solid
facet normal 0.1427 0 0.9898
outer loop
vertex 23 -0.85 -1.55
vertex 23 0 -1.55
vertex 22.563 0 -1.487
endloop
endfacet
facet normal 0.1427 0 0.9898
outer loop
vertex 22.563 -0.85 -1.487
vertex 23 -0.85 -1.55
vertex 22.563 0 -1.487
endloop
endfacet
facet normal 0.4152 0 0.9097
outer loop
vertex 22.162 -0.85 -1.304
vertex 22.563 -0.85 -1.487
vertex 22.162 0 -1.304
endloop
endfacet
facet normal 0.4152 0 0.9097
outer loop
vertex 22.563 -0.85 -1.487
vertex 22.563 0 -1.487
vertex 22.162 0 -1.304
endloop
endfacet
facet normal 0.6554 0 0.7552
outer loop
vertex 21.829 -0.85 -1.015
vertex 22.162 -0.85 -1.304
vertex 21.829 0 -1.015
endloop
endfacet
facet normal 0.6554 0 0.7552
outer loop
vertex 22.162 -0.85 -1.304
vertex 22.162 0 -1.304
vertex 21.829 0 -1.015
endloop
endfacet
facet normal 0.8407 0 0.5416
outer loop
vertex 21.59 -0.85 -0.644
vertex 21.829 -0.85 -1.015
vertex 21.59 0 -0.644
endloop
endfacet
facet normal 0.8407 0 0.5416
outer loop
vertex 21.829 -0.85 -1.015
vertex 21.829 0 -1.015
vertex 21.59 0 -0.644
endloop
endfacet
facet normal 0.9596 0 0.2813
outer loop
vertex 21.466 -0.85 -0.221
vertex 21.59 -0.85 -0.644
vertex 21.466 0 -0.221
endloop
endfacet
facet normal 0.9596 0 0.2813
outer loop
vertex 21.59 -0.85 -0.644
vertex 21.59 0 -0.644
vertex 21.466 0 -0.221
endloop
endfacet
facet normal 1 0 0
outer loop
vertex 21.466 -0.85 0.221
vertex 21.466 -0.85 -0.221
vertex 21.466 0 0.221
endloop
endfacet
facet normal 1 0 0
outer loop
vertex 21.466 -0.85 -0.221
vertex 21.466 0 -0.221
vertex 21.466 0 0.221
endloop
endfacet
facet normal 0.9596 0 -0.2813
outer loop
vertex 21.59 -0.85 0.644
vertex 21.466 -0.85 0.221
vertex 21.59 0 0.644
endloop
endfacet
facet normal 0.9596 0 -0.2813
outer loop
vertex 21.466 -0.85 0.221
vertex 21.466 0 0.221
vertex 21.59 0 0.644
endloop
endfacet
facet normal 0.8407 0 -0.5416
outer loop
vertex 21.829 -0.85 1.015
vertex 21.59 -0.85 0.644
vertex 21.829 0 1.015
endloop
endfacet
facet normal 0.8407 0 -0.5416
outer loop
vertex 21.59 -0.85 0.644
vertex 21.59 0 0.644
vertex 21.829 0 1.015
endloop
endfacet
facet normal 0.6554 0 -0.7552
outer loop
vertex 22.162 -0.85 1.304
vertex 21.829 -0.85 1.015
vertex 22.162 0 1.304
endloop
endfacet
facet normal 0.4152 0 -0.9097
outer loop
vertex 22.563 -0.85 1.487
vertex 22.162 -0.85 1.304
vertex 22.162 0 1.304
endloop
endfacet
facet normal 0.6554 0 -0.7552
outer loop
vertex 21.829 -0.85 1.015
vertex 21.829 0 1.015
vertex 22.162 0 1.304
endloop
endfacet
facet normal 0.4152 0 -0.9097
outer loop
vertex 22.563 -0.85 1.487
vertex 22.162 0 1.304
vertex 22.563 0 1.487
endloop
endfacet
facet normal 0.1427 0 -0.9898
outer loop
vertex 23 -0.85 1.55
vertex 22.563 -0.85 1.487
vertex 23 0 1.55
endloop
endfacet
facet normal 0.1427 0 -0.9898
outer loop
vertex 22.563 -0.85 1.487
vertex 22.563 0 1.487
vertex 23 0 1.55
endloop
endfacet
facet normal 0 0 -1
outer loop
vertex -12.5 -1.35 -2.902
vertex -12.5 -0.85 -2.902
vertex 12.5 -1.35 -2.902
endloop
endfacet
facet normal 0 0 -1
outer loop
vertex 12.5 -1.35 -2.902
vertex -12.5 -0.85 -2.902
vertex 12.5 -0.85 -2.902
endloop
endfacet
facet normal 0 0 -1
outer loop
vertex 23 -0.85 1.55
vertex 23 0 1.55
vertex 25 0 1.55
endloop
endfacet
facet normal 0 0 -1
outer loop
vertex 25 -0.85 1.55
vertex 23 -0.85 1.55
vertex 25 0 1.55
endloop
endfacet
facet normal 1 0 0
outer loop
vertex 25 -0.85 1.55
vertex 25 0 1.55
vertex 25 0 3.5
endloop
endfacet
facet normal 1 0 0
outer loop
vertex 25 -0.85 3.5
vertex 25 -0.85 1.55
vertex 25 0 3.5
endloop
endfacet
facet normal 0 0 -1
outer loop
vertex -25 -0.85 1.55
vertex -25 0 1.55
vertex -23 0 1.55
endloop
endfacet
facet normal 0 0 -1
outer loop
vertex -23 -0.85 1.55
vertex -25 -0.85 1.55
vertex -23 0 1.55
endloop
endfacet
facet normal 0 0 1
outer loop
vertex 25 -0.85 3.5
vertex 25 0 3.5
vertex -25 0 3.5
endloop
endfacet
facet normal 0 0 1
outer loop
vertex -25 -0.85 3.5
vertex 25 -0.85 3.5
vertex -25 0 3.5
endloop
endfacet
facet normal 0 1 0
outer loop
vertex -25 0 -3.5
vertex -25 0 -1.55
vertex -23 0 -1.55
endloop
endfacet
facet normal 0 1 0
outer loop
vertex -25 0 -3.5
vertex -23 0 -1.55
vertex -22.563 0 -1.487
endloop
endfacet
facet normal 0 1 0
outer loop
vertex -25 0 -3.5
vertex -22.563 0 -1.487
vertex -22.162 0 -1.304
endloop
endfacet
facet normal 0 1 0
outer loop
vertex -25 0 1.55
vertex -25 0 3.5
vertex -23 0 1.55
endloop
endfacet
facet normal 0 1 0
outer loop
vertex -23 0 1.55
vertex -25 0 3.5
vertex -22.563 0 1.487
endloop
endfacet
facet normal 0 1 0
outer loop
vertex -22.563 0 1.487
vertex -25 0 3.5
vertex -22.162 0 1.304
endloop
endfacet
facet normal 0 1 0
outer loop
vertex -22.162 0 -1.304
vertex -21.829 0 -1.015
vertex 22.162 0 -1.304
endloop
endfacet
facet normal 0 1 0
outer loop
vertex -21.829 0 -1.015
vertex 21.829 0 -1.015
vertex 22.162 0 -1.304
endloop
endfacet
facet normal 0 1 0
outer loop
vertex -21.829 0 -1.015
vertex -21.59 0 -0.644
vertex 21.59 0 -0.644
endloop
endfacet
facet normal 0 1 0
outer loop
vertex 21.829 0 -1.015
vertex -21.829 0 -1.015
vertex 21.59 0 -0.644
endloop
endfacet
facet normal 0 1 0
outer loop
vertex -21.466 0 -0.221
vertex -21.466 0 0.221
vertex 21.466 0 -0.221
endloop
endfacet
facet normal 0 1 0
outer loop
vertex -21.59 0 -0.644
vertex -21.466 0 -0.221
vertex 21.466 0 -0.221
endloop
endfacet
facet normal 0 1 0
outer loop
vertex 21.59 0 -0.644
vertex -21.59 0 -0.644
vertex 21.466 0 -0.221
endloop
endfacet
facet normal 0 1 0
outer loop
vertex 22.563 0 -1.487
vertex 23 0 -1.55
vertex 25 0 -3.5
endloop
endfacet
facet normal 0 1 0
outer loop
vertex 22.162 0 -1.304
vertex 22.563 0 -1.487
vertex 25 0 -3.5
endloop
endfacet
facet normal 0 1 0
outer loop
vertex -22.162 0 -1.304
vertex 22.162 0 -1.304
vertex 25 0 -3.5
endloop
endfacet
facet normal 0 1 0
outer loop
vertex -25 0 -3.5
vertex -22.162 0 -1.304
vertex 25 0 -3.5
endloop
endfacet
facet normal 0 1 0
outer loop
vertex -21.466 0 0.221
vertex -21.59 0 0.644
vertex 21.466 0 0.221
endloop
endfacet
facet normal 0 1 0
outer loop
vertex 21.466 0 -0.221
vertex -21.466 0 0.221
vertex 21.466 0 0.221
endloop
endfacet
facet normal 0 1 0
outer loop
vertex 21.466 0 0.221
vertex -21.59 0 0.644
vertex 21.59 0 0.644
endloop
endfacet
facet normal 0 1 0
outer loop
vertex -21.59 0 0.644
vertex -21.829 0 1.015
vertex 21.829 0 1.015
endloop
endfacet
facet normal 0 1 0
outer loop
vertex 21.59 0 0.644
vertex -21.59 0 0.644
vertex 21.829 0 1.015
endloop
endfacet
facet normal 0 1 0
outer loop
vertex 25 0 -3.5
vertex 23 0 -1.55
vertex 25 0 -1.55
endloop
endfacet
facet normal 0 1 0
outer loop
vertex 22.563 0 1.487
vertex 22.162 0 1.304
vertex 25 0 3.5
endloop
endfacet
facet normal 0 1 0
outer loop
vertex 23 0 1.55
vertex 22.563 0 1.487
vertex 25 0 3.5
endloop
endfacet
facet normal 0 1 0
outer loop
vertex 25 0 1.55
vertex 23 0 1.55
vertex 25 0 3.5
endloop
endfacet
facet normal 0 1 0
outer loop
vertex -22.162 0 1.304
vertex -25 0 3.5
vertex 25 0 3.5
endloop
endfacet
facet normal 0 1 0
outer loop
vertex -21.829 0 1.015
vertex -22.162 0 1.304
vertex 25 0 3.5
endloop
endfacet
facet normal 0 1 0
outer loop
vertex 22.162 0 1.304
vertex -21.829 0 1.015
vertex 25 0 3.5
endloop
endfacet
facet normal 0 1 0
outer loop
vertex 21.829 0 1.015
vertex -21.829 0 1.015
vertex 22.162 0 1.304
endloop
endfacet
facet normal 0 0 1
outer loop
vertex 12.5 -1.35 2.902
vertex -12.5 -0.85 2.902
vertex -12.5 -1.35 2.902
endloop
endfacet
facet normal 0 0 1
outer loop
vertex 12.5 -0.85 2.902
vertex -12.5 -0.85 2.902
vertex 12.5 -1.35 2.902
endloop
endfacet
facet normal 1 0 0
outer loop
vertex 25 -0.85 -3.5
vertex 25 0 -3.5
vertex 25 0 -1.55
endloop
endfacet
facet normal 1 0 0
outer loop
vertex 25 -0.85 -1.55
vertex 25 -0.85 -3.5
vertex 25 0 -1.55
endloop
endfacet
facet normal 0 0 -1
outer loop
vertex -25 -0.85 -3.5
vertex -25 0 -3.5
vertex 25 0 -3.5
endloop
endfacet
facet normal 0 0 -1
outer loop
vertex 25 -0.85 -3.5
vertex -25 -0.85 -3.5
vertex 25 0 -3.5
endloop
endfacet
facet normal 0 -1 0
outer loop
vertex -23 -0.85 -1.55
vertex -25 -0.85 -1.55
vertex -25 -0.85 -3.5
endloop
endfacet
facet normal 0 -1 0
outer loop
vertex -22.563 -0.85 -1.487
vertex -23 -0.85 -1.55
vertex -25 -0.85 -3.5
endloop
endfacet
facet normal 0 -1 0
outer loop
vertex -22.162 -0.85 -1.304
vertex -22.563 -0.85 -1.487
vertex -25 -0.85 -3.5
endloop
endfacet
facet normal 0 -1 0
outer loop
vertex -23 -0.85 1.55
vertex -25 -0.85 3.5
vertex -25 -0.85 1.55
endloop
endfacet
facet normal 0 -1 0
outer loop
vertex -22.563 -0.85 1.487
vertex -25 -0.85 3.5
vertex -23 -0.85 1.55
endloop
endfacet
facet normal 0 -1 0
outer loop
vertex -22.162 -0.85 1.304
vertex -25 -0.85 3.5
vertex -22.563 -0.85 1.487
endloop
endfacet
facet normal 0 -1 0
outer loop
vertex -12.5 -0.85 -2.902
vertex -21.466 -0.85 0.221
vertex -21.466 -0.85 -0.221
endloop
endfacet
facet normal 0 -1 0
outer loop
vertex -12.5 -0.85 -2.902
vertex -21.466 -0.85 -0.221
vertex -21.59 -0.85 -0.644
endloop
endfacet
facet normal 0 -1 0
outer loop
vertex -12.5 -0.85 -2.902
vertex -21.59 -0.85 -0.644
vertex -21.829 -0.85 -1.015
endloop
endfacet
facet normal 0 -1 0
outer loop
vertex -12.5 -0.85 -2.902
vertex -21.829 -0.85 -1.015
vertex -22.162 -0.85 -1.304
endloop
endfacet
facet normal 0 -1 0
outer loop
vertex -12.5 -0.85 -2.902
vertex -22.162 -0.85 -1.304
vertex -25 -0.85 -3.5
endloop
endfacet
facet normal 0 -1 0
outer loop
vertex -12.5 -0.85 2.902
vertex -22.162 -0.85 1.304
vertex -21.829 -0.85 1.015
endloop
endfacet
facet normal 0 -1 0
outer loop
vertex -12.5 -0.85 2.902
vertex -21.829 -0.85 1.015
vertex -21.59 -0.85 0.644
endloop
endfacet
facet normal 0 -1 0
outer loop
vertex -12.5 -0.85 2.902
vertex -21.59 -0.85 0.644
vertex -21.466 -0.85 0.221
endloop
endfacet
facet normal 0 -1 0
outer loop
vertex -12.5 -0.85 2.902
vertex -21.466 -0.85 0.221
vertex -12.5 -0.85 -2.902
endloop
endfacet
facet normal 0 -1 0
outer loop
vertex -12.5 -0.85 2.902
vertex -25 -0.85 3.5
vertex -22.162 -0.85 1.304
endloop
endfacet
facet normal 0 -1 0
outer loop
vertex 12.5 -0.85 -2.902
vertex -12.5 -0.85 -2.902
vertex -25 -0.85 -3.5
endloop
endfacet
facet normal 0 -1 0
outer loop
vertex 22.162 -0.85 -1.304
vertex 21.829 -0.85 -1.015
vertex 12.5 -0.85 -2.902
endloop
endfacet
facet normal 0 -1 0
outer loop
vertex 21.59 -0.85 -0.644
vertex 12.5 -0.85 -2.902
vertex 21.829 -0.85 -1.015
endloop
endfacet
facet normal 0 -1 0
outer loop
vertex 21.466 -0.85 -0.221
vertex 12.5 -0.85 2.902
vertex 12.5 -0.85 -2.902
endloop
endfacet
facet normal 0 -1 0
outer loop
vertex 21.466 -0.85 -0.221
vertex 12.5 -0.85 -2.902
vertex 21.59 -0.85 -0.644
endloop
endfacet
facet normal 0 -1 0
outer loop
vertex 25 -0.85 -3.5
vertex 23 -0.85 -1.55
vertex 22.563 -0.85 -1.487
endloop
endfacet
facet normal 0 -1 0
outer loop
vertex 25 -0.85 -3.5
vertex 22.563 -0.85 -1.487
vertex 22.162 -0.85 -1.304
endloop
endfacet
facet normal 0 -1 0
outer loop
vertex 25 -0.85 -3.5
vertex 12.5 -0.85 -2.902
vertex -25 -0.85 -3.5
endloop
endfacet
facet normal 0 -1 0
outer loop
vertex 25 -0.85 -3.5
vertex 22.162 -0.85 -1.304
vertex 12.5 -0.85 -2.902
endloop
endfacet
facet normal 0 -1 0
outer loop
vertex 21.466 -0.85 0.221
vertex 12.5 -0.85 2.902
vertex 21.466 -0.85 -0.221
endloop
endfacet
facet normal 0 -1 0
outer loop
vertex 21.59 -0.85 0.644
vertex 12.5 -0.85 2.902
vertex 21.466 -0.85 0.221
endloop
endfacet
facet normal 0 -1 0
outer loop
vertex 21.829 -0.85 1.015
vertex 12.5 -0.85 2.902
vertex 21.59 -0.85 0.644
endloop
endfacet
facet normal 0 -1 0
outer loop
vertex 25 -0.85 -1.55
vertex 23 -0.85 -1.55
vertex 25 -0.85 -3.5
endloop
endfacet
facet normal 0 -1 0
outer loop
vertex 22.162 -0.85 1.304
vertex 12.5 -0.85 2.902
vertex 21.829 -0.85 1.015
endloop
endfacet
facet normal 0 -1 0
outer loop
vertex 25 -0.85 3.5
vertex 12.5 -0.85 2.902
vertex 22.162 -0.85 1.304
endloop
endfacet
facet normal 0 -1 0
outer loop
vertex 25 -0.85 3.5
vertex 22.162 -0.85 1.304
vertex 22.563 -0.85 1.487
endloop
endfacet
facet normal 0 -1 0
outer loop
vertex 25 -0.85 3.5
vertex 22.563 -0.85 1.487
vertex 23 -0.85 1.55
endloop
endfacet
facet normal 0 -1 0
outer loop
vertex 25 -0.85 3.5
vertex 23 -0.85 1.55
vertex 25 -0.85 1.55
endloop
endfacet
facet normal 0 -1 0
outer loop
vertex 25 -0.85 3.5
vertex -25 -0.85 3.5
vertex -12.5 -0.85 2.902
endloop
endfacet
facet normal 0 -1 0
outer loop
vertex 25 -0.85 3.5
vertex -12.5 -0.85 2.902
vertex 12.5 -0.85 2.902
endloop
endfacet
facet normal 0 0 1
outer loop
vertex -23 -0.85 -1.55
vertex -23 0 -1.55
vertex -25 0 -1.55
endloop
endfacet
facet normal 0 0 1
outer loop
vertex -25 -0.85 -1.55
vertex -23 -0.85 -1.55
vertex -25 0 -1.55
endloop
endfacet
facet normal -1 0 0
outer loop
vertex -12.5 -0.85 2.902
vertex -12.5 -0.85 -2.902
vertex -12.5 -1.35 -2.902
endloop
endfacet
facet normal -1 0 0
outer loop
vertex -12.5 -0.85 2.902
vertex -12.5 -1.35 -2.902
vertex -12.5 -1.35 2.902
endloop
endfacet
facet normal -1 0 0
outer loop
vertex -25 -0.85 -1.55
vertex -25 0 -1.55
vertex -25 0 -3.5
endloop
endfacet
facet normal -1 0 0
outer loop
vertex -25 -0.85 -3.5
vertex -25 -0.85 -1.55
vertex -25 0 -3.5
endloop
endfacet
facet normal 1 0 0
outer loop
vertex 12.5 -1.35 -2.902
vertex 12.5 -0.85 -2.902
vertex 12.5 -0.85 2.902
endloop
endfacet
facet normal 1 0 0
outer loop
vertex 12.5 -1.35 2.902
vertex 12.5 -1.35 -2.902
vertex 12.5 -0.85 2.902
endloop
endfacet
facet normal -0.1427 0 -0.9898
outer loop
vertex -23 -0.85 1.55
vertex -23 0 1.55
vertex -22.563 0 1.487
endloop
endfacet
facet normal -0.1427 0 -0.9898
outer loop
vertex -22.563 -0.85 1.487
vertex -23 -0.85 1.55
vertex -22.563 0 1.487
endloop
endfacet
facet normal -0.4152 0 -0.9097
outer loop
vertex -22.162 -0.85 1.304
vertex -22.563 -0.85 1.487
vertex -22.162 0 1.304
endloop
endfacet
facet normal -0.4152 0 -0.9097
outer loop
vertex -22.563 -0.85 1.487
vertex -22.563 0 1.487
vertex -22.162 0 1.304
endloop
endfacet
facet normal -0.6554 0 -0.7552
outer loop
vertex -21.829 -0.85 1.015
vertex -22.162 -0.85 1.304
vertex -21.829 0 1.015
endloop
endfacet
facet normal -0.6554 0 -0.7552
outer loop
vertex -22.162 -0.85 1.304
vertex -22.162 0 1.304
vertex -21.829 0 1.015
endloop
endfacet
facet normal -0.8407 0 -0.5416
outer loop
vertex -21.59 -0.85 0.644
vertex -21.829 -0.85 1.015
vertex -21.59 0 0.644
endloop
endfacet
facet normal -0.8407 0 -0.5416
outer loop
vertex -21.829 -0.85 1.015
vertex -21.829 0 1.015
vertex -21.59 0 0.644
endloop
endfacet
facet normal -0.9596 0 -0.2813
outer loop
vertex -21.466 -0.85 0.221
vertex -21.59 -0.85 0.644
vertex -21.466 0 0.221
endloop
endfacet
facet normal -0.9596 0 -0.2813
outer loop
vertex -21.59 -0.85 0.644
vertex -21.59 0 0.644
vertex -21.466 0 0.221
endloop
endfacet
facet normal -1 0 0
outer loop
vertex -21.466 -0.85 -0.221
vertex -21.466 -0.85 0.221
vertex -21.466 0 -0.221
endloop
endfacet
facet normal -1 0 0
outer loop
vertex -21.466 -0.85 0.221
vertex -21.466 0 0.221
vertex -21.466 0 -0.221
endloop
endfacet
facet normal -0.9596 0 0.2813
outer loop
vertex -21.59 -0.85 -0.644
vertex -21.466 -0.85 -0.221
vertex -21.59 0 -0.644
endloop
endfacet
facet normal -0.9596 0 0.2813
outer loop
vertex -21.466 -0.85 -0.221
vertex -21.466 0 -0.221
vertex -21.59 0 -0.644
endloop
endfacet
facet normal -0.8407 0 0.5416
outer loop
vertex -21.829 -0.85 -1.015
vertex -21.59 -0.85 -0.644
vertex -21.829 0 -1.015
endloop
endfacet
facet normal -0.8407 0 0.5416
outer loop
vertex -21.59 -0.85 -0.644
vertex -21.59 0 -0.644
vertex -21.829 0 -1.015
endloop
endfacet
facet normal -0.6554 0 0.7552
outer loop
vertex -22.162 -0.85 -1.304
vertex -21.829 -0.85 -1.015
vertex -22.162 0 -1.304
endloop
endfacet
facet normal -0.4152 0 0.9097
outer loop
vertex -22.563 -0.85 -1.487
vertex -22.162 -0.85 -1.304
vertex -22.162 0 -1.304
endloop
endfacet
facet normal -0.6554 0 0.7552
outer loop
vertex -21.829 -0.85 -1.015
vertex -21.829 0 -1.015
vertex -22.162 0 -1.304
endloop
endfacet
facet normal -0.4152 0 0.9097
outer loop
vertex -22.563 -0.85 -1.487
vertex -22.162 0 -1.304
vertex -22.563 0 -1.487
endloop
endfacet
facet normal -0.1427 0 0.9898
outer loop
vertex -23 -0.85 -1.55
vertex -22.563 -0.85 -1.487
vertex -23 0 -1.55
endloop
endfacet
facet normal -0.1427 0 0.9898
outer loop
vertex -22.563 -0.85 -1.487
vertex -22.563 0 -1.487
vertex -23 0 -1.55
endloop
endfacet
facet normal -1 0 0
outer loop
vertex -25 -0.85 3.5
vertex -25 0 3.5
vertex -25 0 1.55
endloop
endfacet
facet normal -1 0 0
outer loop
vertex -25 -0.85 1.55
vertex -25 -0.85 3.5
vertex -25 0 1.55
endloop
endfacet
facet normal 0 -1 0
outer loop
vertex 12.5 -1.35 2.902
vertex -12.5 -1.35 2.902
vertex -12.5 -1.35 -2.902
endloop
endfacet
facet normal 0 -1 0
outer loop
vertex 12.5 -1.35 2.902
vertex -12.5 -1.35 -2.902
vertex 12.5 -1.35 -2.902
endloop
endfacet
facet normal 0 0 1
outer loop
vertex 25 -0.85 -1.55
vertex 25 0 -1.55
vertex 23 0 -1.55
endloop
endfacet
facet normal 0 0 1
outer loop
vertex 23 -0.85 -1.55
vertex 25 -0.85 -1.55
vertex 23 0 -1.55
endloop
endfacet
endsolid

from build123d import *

# Parameters (mm, degrees)
F0_W     = 25
F0_H     = 5.803798
F1_DEPTH = 1.35
F2_DEPTH = 0.85


with BuildPart() as f1:
    # F0 (on Front) → F1 (new body)
    with BuildSketch(Plane.XZ):
        Rectangle(F0_W, F0_H)
    extrude(amount=F1_DEPTH)

    # F0 (on Front) → F2 (join)
    with BuildSketch(Plane.XZ):
        with BuildLine():
            Line((25, 1.55), (25, 3.5))
            Line((25, 3.5), (-25, 3.5))
            Line((-25, 3.5), (-25, 1.55))
            Line((-25, 1.55), (-23, 1.55))
            ThreePointArc((-23, 1.55), (-21.45, 0), (-23, -1.55))
            Line((-23, -1.55), (-25, -1.55))
            Line((-25, -1.55), (-25, -3.5))
            Line((-25, -3.5), (25, -3.5))
            Line((25, -3.5), (25, -1.55))
            Line((25, -1.55), (23, -1.55))
            ThreePointArc((23, -1.55), (21.45, 0), (23, 1.55))
            Line((23, 1.55), (25, 1.55))
        make_face()
        Rectangle(F0_W, F0_H, mode=Mode.SUBTRACT)
    extrude(amount=F2_DEPTH)


solid = f1.part
